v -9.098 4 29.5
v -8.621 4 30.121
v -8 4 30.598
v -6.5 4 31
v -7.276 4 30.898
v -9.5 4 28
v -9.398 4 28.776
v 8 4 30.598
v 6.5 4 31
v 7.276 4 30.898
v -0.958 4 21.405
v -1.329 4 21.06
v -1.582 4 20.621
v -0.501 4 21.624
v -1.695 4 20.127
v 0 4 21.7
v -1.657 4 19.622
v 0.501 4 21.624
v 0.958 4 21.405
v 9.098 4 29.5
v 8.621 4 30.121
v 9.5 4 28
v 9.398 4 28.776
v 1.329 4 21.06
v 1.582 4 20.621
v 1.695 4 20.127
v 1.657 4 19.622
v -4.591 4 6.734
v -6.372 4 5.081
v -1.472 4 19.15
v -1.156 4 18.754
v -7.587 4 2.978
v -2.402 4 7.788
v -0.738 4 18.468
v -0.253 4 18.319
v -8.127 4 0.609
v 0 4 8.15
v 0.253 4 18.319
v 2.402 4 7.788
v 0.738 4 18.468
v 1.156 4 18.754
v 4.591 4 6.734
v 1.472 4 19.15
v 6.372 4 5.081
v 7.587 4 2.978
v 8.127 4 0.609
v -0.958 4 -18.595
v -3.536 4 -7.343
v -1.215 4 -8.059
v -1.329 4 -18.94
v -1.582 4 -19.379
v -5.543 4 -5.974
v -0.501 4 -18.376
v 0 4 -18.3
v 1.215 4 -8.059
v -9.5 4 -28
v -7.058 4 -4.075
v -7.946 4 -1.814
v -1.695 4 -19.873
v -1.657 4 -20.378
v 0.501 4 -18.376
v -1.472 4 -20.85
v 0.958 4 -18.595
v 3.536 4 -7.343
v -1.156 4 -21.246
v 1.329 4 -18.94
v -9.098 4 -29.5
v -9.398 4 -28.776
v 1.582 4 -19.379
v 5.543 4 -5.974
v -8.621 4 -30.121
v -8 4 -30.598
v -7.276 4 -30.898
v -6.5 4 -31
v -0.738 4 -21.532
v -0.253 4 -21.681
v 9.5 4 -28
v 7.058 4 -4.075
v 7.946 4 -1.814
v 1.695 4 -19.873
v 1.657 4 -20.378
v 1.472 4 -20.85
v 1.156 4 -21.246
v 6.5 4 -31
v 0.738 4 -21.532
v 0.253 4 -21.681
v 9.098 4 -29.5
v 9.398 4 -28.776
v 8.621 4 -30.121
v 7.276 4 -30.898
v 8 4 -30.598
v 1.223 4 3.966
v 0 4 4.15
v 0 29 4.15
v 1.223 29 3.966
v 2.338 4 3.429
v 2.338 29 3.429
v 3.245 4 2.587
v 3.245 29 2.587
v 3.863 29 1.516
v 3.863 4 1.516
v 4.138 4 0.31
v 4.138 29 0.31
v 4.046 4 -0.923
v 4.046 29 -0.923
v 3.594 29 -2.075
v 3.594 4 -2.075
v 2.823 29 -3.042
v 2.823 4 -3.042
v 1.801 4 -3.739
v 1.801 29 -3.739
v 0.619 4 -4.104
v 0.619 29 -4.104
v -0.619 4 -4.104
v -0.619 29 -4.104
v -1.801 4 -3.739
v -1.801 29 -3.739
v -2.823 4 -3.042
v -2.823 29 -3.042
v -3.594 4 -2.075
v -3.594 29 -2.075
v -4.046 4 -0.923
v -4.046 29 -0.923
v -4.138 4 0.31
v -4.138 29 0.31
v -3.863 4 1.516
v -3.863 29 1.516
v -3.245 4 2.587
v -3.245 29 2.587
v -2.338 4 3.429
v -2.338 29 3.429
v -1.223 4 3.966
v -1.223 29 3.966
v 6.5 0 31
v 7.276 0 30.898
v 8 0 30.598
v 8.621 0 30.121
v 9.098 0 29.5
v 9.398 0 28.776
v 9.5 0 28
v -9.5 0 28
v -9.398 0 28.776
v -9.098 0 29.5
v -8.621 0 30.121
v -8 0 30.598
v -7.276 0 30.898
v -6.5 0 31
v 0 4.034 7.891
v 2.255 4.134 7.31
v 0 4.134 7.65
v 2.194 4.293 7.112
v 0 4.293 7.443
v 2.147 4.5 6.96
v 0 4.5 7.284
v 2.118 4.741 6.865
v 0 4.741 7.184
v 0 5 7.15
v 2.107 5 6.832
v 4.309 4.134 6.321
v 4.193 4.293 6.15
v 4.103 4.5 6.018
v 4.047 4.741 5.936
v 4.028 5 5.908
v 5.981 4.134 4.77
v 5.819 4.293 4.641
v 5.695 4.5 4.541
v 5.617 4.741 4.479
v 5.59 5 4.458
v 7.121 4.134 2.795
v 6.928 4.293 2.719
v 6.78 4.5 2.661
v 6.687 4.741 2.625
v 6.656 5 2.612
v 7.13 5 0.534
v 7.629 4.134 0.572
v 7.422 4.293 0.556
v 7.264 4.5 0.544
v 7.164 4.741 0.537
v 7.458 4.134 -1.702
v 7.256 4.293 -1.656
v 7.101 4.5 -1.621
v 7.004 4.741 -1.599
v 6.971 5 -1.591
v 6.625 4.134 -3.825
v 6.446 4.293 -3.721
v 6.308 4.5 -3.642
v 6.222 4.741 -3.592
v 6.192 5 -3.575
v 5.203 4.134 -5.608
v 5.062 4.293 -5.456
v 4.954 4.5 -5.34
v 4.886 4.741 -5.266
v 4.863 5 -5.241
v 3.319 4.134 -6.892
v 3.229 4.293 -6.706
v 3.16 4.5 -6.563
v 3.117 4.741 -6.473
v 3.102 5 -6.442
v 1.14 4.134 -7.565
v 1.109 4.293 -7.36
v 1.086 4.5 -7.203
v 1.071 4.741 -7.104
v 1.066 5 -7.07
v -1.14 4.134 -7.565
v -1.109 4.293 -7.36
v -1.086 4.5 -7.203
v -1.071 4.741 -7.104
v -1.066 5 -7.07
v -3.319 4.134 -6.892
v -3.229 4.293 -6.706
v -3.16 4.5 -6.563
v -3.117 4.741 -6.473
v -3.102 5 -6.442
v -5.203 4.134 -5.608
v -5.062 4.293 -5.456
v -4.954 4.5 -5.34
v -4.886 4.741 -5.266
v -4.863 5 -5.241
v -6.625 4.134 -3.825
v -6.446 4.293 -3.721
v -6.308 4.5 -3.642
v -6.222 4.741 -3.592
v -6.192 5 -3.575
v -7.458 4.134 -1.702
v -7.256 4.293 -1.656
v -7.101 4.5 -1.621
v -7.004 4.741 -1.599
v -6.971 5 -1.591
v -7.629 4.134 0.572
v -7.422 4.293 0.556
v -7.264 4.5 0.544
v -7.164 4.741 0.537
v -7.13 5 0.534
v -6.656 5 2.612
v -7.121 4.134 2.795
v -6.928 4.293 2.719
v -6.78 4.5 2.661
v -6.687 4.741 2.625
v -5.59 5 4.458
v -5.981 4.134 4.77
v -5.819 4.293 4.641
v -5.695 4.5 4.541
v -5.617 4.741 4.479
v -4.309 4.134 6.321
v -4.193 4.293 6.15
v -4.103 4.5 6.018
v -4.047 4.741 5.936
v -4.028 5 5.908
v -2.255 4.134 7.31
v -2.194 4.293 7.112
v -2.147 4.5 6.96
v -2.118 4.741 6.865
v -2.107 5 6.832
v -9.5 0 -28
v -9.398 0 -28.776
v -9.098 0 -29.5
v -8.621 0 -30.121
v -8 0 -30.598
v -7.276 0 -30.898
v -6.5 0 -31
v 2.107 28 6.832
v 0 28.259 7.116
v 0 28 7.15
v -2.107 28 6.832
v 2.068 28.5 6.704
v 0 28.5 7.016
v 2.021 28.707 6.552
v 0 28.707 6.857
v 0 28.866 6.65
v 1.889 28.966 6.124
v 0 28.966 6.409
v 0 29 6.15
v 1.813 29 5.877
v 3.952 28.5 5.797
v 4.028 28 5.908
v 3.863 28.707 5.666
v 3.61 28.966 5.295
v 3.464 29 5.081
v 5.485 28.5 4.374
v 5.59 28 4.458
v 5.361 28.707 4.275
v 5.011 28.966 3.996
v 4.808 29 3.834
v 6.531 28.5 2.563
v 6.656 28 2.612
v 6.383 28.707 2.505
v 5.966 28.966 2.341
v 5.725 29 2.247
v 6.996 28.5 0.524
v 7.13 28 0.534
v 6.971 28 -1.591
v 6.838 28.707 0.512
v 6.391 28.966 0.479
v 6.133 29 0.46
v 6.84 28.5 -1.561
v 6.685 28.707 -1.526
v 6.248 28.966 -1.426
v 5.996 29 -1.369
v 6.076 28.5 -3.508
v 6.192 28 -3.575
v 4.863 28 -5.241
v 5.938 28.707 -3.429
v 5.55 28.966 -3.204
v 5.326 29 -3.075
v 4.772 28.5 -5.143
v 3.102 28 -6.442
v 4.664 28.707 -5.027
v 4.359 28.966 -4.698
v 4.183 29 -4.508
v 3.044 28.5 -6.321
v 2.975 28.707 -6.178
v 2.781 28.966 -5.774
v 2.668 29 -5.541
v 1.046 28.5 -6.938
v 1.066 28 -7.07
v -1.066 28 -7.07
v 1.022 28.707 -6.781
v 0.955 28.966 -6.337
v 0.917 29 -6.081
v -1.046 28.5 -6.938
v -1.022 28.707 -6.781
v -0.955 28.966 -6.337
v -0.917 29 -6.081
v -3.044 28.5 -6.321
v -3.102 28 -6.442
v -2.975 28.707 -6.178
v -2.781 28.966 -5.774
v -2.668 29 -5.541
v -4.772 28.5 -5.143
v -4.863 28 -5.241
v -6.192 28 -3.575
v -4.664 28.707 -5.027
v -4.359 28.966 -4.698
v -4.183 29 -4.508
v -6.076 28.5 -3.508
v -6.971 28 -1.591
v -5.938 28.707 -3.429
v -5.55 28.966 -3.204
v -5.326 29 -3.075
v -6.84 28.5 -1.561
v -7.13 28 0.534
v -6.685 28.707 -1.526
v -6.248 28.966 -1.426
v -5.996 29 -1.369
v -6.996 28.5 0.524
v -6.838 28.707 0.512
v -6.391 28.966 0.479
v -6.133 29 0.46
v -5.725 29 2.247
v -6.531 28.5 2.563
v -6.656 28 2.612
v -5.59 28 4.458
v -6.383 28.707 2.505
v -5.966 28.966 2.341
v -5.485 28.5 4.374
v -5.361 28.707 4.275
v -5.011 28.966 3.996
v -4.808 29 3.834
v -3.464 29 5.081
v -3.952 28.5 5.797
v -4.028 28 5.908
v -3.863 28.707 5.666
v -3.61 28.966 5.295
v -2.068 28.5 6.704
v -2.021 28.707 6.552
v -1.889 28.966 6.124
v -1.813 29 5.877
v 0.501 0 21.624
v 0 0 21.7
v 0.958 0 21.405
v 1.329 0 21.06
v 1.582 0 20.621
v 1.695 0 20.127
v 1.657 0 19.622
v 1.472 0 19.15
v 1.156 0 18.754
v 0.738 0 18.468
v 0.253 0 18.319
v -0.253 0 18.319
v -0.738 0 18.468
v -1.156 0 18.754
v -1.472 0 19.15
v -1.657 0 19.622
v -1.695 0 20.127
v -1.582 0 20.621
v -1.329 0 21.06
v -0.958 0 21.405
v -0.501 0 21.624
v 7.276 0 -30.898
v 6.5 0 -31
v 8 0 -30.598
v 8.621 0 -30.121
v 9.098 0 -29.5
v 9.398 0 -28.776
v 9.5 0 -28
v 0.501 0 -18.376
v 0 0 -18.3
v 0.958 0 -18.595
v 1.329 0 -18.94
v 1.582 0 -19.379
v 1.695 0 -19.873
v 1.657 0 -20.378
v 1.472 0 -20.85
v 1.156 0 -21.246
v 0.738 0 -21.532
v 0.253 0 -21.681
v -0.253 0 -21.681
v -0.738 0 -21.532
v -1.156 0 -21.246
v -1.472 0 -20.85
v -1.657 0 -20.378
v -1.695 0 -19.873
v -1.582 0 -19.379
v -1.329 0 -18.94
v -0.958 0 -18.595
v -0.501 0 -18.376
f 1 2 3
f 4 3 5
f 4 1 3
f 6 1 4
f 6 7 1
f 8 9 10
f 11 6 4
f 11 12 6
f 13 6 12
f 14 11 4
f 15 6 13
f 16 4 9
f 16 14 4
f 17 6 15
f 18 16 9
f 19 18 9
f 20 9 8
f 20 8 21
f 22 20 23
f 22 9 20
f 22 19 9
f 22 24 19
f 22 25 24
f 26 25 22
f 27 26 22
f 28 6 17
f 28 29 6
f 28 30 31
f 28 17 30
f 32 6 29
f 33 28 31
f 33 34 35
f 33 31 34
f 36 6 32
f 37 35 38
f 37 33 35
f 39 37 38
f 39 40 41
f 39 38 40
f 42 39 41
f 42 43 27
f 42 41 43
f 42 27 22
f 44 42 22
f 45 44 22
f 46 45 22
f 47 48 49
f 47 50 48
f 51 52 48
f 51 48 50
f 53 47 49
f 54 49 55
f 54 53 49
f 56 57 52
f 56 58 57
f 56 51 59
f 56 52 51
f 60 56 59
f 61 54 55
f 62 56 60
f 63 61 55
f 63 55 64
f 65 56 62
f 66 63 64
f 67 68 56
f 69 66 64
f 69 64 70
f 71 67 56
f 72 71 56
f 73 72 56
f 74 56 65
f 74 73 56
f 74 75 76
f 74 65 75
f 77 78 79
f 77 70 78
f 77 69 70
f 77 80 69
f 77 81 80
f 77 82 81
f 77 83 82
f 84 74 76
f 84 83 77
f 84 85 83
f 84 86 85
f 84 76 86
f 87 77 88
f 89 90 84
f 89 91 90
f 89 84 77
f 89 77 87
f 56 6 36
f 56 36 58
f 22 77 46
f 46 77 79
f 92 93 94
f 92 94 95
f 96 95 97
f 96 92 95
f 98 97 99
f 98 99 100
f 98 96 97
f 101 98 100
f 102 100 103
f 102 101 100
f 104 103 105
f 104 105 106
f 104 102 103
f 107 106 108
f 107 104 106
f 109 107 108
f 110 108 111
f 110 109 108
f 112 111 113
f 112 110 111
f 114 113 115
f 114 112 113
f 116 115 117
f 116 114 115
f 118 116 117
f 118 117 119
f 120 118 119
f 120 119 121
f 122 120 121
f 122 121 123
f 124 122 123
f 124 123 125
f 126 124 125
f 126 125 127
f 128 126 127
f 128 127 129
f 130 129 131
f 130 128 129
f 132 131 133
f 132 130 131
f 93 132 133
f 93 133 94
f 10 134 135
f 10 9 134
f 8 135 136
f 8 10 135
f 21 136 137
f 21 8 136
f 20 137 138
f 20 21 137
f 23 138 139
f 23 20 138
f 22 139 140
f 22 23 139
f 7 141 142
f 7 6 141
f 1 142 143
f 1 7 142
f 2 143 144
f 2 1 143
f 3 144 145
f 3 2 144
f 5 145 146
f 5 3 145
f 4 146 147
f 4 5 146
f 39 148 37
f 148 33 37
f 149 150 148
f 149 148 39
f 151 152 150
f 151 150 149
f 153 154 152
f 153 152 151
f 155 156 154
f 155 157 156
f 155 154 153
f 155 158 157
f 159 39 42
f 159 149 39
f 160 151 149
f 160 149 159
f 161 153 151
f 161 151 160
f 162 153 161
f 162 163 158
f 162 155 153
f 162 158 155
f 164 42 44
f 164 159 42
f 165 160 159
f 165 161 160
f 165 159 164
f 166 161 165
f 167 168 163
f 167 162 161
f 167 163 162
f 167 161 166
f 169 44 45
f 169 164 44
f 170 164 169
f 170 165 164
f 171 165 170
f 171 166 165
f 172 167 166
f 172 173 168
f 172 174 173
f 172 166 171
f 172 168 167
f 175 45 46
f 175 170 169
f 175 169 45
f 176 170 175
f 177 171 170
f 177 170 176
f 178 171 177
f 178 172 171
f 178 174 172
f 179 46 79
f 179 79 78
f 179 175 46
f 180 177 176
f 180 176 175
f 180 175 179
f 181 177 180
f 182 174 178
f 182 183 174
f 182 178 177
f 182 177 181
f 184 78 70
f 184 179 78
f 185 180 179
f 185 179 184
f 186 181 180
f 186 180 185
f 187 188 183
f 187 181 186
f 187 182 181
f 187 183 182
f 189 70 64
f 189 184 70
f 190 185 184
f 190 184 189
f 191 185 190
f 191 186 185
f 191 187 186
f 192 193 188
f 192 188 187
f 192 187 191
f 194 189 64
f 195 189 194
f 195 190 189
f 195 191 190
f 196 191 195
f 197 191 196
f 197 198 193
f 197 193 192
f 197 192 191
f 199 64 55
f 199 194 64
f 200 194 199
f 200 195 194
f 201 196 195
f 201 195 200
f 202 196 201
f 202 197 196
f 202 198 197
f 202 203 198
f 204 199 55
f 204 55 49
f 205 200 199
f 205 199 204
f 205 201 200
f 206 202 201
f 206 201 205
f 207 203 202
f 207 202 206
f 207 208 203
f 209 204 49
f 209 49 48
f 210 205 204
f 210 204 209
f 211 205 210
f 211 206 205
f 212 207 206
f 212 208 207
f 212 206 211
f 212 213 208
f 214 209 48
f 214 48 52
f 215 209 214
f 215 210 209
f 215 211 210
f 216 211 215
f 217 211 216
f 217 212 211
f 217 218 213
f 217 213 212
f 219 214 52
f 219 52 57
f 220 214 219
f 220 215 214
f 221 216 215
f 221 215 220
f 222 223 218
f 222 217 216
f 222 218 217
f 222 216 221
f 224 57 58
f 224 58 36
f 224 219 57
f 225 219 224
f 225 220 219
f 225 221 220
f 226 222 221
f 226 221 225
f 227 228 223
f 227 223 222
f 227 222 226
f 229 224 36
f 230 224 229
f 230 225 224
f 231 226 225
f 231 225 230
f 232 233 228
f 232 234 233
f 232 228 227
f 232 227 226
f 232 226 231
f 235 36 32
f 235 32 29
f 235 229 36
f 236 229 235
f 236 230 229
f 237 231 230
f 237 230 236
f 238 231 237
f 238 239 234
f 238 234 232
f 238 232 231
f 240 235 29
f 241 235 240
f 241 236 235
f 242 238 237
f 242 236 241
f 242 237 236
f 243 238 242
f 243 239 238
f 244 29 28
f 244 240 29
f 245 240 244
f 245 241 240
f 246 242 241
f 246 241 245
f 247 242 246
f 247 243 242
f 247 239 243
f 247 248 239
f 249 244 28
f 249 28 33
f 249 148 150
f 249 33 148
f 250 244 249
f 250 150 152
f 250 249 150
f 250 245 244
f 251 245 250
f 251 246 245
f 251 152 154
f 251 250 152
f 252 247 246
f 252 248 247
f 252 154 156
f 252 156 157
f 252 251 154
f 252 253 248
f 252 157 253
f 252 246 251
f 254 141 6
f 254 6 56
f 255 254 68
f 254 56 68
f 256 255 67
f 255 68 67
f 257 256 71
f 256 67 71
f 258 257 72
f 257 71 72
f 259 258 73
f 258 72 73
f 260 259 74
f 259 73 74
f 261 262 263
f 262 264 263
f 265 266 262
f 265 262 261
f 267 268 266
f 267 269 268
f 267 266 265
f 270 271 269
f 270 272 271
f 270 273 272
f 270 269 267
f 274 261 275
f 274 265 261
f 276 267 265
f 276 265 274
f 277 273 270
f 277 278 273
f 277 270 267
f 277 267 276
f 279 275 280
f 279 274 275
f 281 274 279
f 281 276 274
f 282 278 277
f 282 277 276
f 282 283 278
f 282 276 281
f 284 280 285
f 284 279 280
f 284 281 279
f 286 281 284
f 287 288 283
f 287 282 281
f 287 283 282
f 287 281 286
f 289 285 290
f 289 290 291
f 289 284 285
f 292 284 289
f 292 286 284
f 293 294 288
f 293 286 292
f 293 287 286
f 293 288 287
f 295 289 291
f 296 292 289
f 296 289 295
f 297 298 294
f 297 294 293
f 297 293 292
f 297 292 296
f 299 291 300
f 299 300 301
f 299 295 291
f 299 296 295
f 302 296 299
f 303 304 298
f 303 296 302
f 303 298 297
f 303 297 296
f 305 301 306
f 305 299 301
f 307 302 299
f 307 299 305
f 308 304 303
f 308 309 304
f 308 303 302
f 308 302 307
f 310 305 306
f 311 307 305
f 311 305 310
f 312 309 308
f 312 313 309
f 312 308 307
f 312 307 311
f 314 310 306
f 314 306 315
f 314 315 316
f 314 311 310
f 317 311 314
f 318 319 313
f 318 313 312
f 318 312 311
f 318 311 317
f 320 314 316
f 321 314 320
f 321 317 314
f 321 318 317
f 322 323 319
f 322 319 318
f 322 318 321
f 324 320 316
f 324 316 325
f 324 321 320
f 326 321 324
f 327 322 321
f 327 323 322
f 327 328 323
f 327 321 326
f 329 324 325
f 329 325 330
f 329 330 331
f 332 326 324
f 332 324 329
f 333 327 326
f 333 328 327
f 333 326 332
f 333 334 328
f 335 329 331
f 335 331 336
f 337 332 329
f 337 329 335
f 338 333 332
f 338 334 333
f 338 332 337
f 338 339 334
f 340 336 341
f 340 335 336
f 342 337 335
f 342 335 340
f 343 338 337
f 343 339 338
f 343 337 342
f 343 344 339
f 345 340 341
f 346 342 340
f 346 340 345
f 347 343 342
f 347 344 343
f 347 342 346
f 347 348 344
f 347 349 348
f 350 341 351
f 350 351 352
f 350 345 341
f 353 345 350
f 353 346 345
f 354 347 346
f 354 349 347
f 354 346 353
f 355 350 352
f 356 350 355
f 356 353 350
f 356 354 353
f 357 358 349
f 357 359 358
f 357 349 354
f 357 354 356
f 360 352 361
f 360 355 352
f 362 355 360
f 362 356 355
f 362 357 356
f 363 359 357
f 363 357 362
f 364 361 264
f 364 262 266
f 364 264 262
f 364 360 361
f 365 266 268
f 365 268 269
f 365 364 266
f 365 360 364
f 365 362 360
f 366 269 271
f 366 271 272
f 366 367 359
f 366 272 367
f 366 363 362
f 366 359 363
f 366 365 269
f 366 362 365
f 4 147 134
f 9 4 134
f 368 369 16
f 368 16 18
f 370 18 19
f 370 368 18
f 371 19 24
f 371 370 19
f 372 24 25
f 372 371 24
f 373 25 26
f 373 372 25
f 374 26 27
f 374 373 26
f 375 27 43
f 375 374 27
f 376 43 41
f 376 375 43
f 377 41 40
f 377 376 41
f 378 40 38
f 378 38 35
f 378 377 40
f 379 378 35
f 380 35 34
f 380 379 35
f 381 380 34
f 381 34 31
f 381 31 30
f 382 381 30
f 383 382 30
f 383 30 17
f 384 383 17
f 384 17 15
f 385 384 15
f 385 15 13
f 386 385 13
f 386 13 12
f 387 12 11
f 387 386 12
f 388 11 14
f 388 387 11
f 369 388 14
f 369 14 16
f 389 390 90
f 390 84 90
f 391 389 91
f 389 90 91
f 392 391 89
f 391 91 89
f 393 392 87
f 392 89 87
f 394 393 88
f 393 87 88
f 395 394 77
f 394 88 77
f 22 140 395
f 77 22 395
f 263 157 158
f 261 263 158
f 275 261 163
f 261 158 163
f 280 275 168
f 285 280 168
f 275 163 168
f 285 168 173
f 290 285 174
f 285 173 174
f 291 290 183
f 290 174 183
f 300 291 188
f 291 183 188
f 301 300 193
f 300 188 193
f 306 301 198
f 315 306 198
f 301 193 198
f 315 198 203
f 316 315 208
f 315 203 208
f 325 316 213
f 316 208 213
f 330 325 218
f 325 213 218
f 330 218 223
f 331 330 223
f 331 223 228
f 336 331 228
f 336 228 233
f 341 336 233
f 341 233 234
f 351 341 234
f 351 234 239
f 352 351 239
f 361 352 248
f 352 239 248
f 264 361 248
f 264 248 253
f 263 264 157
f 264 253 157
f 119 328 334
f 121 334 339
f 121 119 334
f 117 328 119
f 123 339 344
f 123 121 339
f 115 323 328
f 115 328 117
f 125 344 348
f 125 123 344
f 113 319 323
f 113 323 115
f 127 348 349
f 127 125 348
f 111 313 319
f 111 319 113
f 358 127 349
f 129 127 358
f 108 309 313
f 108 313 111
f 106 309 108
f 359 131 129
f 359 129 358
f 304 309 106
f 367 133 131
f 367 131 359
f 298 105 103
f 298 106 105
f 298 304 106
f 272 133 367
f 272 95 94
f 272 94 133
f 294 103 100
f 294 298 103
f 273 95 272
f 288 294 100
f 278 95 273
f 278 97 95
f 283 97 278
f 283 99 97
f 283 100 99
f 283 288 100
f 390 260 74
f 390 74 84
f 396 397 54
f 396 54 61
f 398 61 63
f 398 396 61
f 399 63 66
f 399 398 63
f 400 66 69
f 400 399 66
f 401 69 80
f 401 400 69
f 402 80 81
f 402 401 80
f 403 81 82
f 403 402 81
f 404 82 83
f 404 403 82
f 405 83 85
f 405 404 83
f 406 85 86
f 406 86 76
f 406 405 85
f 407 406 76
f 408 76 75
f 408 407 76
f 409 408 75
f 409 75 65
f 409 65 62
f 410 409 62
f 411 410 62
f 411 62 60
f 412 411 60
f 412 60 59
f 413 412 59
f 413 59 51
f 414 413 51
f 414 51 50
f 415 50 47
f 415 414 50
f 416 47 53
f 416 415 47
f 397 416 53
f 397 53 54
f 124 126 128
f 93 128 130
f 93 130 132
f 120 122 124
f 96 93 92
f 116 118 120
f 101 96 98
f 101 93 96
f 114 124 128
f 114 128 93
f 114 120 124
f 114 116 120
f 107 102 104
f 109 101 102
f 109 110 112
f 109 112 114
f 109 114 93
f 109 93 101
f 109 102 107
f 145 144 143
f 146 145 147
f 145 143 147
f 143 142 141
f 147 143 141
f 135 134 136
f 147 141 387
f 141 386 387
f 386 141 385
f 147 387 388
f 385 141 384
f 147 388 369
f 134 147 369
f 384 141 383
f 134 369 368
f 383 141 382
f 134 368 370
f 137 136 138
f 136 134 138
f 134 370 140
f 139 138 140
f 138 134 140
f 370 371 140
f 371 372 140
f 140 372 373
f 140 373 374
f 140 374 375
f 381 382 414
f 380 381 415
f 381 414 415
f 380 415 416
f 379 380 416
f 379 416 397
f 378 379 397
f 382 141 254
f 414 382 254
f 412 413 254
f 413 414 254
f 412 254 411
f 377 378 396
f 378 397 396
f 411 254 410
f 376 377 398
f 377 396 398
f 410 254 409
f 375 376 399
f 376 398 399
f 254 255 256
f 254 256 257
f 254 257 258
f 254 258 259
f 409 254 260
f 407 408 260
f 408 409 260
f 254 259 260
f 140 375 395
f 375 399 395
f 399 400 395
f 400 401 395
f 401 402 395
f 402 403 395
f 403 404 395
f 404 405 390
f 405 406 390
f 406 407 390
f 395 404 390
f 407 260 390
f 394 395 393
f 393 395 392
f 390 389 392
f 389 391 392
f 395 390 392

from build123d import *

# Parameters (mm, degrees)
SKETCH_2_W      = 19
SKETCH_2_H      = 62
SKETCH_2_R      = 1.7
EXTRUDE_1_DEPTH = 4
SKETCH_3_R      = 7.15
SKETCH_3_R_2    = 4.15
EXTRUDE_2_DEPTH = 25
FILLET_1_R      = 3
FILLET_2_R      = 1


with BuildPart() as part:
    # 草图2 → 凸台-拉伸1 (new body)
    with BuildSketch(Plane(origin=(0, 0, 0), x_dir=(1, 0, 0), z_dir=(0, 1, 0))):
        Rectangle(SKETCH_2_W, SKETCH_2_H)
        with Locations(Location((0, 20, 0), (0, 0, 270))):
            Circle(SKETCH_2_R, mode=Mode.SUBTRACT)
        with Locations(Location((0, -20, 0), (0, 0, 270))):
            Circle(SKETCH_2_R, mode=Mode.SUBTRACT)
    extrude(amount=EXTRUDE_1_DEPTH)

    # 草图3 → 凸台-拉伸2 (add)
    with BuildSketch(Plane(origin=(0, 4, 0), x_dir=(1, 0, 0), z_dir=(0, 1, 0))):
        with Locations(Location((0, 0, 0), (0, 0, 270))):
            Circle(SKETCH_3_R)
        with Locations(Location((0, 0, 0), (0, 0, 270))):
            Circle(SKETCH_3_R_2, mode=Mode.SUBTRACT)
    extrude(amount=EXTRUDE_2_DEPTH)

    # 圆角1
    fillet_1_edges = [part.edges().sort_by_distance(p)[0] for p in [
        (-9.5, 2, -31),
        (9.5, 2, -31),
        (9.5, 2, 31),
        (-9.5, 2, 31),
    ]]
    fillet(fillet_1_edges, radius=FILLET_1_R)

    # 圆角2
    fillet_2_edges = [part.edges().sort_by_distance(p)[0] for p in [
        (0, 29, -7.15),
        (0, 4, -7.15),
    ]]
    fillet(fillet_2_edges, radius=FILLET_2_R)


solid = part.part
